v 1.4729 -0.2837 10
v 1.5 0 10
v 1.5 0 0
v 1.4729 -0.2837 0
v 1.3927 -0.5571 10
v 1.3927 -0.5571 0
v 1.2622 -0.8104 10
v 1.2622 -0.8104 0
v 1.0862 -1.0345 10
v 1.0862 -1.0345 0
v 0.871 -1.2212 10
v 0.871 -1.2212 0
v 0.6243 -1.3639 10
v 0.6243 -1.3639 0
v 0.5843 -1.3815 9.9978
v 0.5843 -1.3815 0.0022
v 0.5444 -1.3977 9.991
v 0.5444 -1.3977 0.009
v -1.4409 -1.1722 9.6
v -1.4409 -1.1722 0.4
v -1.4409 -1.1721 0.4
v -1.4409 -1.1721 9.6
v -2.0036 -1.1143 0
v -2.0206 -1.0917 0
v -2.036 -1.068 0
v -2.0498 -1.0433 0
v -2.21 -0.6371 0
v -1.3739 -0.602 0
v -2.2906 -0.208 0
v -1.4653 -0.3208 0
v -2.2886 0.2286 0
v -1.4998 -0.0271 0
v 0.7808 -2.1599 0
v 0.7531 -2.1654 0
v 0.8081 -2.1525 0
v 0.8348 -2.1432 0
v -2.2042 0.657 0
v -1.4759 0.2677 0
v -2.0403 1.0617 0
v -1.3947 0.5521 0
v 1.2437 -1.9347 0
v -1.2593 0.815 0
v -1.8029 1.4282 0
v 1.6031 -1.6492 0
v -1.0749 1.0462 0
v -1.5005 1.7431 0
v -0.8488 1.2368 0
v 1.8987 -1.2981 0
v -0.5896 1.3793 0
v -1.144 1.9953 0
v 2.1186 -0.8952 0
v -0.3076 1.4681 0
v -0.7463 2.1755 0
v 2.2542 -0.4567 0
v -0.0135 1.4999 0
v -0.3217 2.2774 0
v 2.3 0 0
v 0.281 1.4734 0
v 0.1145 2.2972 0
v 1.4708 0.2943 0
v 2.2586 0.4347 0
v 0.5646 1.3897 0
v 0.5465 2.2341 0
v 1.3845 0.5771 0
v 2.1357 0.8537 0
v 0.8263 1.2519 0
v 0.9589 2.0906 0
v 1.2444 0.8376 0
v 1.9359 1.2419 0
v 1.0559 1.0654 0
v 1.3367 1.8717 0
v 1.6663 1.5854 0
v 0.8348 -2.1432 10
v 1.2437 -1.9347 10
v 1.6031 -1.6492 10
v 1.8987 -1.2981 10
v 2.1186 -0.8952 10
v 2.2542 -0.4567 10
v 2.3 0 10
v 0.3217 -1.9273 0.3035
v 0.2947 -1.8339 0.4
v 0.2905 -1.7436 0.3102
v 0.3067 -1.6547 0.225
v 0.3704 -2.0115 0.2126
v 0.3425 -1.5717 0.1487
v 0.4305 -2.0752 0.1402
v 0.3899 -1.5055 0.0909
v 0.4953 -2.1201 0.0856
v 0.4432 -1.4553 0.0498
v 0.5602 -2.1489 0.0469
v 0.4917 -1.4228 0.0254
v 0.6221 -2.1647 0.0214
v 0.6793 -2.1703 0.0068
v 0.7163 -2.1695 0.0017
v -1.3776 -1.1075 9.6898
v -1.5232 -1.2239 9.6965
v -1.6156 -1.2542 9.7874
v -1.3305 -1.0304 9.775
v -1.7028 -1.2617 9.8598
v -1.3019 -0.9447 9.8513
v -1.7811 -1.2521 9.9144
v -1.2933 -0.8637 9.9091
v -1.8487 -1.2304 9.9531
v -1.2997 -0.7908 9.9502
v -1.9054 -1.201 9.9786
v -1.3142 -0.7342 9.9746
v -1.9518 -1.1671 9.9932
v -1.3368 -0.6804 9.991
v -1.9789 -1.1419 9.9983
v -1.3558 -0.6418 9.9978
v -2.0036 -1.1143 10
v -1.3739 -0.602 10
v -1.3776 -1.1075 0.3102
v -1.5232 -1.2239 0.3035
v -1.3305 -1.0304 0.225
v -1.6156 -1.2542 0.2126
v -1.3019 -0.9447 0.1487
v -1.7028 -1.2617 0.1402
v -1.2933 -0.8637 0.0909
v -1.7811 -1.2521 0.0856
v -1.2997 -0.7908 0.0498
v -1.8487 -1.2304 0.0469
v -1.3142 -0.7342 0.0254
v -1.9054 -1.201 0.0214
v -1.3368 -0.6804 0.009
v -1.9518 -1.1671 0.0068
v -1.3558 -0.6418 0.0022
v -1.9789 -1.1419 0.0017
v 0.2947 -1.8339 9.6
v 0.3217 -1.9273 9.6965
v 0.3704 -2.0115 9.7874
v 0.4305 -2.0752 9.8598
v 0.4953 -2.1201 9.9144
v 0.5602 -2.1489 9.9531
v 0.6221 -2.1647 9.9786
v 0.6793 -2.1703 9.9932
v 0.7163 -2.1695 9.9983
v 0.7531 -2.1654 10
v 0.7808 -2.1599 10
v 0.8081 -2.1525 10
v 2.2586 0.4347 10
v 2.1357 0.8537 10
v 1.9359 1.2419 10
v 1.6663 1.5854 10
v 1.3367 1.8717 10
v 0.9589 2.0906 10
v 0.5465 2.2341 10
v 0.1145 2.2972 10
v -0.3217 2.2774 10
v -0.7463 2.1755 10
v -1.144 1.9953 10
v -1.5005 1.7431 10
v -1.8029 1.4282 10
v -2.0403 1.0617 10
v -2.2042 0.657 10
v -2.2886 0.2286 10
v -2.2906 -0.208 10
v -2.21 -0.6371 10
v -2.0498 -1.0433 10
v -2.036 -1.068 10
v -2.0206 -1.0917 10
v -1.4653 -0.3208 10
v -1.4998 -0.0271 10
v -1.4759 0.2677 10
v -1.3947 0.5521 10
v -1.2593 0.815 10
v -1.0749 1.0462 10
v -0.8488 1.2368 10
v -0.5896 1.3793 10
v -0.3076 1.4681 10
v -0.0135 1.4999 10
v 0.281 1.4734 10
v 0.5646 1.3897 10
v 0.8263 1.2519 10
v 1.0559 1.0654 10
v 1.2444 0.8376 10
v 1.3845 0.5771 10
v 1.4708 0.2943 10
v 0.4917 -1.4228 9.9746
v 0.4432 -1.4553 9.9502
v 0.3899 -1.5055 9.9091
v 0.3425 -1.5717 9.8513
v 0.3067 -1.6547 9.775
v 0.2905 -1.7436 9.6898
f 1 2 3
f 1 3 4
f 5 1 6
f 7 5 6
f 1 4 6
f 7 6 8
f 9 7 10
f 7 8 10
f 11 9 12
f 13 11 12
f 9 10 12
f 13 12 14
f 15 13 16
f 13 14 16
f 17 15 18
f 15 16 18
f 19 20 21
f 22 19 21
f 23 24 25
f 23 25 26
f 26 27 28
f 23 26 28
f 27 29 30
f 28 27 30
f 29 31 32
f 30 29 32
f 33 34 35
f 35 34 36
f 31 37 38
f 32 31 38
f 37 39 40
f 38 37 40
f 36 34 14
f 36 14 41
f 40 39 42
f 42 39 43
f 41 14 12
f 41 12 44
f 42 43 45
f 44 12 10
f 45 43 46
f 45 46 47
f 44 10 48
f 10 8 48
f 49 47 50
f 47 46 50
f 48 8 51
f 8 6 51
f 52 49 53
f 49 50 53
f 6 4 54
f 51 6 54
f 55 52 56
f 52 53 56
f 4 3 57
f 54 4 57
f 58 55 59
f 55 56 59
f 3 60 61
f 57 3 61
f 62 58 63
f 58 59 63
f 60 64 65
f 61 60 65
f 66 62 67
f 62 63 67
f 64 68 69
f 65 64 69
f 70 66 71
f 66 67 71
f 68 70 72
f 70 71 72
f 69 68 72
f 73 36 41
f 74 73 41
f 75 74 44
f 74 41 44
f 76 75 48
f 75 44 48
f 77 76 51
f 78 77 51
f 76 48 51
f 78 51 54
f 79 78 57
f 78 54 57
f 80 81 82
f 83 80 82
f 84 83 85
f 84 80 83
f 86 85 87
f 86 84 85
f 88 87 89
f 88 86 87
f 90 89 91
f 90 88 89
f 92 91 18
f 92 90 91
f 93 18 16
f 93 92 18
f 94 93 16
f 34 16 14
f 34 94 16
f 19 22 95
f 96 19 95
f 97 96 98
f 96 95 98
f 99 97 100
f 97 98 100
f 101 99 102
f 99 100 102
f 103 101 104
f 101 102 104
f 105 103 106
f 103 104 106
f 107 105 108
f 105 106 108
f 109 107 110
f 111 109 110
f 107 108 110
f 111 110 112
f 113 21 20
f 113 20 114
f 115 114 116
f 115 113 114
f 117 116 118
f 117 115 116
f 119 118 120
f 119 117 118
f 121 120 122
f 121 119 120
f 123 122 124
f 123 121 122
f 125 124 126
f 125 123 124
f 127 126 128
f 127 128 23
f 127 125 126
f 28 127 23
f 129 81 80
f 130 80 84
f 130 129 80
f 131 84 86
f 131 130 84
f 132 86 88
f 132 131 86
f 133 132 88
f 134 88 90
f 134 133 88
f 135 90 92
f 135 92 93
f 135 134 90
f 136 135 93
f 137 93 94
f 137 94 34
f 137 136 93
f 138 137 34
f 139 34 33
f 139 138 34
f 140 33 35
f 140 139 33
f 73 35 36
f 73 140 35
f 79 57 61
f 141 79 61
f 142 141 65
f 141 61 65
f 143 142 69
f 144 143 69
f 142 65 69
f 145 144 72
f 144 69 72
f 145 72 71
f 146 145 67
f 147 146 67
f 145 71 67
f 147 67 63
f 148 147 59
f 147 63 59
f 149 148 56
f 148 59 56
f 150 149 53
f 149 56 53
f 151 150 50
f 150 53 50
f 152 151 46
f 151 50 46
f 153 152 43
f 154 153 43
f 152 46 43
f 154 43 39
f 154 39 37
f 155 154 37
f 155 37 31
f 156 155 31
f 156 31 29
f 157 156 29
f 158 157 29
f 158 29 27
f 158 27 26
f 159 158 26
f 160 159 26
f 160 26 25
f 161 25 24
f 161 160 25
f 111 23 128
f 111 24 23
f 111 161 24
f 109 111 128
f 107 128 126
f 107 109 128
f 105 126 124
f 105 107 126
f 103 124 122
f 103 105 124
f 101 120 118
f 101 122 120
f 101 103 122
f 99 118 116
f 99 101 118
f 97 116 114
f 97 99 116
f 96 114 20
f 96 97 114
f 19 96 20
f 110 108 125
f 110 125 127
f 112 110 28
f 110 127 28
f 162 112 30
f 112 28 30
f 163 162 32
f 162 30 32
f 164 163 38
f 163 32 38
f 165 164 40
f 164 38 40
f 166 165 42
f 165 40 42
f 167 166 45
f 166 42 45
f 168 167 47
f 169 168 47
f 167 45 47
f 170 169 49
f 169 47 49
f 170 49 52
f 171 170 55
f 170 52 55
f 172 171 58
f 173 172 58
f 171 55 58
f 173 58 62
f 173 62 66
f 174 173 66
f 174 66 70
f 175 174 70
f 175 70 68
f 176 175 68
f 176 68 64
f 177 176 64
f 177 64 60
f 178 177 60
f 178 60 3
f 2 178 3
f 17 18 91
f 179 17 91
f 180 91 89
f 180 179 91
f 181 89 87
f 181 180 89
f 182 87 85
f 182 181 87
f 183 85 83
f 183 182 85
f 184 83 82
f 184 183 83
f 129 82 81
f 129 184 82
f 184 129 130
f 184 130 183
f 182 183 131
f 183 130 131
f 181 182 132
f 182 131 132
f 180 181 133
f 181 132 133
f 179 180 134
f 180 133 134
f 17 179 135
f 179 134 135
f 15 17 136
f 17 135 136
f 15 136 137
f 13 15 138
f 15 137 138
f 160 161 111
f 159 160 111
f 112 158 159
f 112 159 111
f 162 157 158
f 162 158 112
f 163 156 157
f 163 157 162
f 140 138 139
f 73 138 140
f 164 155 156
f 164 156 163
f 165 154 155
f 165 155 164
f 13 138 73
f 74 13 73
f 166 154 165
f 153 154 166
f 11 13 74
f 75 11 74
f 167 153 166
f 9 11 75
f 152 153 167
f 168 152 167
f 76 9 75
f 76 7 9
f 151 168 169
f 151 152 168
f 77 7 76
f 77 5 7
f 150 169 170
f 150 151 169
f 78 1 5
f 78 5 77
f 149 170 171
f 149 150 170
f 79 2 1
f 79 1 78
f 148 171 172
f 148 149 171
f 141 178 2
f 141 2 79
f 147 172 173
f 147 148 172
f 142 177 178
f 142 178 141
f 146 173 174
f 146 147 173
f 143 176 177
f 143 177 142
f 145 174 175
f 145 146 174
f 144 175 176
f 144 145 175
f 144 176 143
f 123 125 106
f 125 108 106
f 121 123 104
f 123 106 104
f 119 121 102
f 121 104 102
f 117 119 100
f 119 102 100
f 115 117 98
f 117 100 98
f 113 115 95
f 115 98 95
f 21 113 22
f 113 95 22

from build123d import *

# Parameters (mm, degrees)
F1_DEPTH = 10
F2_R     = 0.39999


# Not quite as in the source:
# - a fillet or chamfer is up to 0.001 mm smaller than in the source, because OpenCascade refuses the exact size


with BuildPart() as f1:
    # F0 (on Top) → F1 (new body)
    with BuildSketch(Plane.XY):
        with BuildLine():
            ThreePointArc((-1.1635984277, -0.9465932067), (-0.502295908, 1.4133997385), (1.5, 0))
            ThreePointArc((1.5, 0), (1.1417008858, -0.9728921252), (0.2379745502, -1.4810024016))
            Line((0.2379745502, -1.4810024016), (0.3648943103, -2.2708703491))
            ThreePointArc((0.3648943103, -2.2708703491), (1.7506080249, -1.4917679254), (2.3, 0))
            ThreePointArc((2.3, 0), (-0.7701870589, 2.1672129324), (-1.7841842559, -1.4514429169))
            Line((-1.7841842559, -1.4514429169), (-1.1635984277, -0.9465932067))
        make_face()
    extrude(amount=F1_DEPTH)

    # F2 (radius 0.4 in the source; OpenCascade refuses exactly that, so slightly less here)
    f2_edges = [f1.edges().sort_by_distance(p)[0] for p in [
        (-1.784184, -1.451443, 5),
        (-1.163598, -0.946593, 5),
        (-1.473891, -1.199018, 0),
        (-1.473891, -1.199018, 10),
        (0.237975, -1.481002, 5),
        (0.364894, -2.27087, 5),
        (0.301434, -1.875936, 0),
        (0.301434, -1.875936, 10),
    ]]
    fillet(f2_edges, radius=F2_R)


solid = f1.part
